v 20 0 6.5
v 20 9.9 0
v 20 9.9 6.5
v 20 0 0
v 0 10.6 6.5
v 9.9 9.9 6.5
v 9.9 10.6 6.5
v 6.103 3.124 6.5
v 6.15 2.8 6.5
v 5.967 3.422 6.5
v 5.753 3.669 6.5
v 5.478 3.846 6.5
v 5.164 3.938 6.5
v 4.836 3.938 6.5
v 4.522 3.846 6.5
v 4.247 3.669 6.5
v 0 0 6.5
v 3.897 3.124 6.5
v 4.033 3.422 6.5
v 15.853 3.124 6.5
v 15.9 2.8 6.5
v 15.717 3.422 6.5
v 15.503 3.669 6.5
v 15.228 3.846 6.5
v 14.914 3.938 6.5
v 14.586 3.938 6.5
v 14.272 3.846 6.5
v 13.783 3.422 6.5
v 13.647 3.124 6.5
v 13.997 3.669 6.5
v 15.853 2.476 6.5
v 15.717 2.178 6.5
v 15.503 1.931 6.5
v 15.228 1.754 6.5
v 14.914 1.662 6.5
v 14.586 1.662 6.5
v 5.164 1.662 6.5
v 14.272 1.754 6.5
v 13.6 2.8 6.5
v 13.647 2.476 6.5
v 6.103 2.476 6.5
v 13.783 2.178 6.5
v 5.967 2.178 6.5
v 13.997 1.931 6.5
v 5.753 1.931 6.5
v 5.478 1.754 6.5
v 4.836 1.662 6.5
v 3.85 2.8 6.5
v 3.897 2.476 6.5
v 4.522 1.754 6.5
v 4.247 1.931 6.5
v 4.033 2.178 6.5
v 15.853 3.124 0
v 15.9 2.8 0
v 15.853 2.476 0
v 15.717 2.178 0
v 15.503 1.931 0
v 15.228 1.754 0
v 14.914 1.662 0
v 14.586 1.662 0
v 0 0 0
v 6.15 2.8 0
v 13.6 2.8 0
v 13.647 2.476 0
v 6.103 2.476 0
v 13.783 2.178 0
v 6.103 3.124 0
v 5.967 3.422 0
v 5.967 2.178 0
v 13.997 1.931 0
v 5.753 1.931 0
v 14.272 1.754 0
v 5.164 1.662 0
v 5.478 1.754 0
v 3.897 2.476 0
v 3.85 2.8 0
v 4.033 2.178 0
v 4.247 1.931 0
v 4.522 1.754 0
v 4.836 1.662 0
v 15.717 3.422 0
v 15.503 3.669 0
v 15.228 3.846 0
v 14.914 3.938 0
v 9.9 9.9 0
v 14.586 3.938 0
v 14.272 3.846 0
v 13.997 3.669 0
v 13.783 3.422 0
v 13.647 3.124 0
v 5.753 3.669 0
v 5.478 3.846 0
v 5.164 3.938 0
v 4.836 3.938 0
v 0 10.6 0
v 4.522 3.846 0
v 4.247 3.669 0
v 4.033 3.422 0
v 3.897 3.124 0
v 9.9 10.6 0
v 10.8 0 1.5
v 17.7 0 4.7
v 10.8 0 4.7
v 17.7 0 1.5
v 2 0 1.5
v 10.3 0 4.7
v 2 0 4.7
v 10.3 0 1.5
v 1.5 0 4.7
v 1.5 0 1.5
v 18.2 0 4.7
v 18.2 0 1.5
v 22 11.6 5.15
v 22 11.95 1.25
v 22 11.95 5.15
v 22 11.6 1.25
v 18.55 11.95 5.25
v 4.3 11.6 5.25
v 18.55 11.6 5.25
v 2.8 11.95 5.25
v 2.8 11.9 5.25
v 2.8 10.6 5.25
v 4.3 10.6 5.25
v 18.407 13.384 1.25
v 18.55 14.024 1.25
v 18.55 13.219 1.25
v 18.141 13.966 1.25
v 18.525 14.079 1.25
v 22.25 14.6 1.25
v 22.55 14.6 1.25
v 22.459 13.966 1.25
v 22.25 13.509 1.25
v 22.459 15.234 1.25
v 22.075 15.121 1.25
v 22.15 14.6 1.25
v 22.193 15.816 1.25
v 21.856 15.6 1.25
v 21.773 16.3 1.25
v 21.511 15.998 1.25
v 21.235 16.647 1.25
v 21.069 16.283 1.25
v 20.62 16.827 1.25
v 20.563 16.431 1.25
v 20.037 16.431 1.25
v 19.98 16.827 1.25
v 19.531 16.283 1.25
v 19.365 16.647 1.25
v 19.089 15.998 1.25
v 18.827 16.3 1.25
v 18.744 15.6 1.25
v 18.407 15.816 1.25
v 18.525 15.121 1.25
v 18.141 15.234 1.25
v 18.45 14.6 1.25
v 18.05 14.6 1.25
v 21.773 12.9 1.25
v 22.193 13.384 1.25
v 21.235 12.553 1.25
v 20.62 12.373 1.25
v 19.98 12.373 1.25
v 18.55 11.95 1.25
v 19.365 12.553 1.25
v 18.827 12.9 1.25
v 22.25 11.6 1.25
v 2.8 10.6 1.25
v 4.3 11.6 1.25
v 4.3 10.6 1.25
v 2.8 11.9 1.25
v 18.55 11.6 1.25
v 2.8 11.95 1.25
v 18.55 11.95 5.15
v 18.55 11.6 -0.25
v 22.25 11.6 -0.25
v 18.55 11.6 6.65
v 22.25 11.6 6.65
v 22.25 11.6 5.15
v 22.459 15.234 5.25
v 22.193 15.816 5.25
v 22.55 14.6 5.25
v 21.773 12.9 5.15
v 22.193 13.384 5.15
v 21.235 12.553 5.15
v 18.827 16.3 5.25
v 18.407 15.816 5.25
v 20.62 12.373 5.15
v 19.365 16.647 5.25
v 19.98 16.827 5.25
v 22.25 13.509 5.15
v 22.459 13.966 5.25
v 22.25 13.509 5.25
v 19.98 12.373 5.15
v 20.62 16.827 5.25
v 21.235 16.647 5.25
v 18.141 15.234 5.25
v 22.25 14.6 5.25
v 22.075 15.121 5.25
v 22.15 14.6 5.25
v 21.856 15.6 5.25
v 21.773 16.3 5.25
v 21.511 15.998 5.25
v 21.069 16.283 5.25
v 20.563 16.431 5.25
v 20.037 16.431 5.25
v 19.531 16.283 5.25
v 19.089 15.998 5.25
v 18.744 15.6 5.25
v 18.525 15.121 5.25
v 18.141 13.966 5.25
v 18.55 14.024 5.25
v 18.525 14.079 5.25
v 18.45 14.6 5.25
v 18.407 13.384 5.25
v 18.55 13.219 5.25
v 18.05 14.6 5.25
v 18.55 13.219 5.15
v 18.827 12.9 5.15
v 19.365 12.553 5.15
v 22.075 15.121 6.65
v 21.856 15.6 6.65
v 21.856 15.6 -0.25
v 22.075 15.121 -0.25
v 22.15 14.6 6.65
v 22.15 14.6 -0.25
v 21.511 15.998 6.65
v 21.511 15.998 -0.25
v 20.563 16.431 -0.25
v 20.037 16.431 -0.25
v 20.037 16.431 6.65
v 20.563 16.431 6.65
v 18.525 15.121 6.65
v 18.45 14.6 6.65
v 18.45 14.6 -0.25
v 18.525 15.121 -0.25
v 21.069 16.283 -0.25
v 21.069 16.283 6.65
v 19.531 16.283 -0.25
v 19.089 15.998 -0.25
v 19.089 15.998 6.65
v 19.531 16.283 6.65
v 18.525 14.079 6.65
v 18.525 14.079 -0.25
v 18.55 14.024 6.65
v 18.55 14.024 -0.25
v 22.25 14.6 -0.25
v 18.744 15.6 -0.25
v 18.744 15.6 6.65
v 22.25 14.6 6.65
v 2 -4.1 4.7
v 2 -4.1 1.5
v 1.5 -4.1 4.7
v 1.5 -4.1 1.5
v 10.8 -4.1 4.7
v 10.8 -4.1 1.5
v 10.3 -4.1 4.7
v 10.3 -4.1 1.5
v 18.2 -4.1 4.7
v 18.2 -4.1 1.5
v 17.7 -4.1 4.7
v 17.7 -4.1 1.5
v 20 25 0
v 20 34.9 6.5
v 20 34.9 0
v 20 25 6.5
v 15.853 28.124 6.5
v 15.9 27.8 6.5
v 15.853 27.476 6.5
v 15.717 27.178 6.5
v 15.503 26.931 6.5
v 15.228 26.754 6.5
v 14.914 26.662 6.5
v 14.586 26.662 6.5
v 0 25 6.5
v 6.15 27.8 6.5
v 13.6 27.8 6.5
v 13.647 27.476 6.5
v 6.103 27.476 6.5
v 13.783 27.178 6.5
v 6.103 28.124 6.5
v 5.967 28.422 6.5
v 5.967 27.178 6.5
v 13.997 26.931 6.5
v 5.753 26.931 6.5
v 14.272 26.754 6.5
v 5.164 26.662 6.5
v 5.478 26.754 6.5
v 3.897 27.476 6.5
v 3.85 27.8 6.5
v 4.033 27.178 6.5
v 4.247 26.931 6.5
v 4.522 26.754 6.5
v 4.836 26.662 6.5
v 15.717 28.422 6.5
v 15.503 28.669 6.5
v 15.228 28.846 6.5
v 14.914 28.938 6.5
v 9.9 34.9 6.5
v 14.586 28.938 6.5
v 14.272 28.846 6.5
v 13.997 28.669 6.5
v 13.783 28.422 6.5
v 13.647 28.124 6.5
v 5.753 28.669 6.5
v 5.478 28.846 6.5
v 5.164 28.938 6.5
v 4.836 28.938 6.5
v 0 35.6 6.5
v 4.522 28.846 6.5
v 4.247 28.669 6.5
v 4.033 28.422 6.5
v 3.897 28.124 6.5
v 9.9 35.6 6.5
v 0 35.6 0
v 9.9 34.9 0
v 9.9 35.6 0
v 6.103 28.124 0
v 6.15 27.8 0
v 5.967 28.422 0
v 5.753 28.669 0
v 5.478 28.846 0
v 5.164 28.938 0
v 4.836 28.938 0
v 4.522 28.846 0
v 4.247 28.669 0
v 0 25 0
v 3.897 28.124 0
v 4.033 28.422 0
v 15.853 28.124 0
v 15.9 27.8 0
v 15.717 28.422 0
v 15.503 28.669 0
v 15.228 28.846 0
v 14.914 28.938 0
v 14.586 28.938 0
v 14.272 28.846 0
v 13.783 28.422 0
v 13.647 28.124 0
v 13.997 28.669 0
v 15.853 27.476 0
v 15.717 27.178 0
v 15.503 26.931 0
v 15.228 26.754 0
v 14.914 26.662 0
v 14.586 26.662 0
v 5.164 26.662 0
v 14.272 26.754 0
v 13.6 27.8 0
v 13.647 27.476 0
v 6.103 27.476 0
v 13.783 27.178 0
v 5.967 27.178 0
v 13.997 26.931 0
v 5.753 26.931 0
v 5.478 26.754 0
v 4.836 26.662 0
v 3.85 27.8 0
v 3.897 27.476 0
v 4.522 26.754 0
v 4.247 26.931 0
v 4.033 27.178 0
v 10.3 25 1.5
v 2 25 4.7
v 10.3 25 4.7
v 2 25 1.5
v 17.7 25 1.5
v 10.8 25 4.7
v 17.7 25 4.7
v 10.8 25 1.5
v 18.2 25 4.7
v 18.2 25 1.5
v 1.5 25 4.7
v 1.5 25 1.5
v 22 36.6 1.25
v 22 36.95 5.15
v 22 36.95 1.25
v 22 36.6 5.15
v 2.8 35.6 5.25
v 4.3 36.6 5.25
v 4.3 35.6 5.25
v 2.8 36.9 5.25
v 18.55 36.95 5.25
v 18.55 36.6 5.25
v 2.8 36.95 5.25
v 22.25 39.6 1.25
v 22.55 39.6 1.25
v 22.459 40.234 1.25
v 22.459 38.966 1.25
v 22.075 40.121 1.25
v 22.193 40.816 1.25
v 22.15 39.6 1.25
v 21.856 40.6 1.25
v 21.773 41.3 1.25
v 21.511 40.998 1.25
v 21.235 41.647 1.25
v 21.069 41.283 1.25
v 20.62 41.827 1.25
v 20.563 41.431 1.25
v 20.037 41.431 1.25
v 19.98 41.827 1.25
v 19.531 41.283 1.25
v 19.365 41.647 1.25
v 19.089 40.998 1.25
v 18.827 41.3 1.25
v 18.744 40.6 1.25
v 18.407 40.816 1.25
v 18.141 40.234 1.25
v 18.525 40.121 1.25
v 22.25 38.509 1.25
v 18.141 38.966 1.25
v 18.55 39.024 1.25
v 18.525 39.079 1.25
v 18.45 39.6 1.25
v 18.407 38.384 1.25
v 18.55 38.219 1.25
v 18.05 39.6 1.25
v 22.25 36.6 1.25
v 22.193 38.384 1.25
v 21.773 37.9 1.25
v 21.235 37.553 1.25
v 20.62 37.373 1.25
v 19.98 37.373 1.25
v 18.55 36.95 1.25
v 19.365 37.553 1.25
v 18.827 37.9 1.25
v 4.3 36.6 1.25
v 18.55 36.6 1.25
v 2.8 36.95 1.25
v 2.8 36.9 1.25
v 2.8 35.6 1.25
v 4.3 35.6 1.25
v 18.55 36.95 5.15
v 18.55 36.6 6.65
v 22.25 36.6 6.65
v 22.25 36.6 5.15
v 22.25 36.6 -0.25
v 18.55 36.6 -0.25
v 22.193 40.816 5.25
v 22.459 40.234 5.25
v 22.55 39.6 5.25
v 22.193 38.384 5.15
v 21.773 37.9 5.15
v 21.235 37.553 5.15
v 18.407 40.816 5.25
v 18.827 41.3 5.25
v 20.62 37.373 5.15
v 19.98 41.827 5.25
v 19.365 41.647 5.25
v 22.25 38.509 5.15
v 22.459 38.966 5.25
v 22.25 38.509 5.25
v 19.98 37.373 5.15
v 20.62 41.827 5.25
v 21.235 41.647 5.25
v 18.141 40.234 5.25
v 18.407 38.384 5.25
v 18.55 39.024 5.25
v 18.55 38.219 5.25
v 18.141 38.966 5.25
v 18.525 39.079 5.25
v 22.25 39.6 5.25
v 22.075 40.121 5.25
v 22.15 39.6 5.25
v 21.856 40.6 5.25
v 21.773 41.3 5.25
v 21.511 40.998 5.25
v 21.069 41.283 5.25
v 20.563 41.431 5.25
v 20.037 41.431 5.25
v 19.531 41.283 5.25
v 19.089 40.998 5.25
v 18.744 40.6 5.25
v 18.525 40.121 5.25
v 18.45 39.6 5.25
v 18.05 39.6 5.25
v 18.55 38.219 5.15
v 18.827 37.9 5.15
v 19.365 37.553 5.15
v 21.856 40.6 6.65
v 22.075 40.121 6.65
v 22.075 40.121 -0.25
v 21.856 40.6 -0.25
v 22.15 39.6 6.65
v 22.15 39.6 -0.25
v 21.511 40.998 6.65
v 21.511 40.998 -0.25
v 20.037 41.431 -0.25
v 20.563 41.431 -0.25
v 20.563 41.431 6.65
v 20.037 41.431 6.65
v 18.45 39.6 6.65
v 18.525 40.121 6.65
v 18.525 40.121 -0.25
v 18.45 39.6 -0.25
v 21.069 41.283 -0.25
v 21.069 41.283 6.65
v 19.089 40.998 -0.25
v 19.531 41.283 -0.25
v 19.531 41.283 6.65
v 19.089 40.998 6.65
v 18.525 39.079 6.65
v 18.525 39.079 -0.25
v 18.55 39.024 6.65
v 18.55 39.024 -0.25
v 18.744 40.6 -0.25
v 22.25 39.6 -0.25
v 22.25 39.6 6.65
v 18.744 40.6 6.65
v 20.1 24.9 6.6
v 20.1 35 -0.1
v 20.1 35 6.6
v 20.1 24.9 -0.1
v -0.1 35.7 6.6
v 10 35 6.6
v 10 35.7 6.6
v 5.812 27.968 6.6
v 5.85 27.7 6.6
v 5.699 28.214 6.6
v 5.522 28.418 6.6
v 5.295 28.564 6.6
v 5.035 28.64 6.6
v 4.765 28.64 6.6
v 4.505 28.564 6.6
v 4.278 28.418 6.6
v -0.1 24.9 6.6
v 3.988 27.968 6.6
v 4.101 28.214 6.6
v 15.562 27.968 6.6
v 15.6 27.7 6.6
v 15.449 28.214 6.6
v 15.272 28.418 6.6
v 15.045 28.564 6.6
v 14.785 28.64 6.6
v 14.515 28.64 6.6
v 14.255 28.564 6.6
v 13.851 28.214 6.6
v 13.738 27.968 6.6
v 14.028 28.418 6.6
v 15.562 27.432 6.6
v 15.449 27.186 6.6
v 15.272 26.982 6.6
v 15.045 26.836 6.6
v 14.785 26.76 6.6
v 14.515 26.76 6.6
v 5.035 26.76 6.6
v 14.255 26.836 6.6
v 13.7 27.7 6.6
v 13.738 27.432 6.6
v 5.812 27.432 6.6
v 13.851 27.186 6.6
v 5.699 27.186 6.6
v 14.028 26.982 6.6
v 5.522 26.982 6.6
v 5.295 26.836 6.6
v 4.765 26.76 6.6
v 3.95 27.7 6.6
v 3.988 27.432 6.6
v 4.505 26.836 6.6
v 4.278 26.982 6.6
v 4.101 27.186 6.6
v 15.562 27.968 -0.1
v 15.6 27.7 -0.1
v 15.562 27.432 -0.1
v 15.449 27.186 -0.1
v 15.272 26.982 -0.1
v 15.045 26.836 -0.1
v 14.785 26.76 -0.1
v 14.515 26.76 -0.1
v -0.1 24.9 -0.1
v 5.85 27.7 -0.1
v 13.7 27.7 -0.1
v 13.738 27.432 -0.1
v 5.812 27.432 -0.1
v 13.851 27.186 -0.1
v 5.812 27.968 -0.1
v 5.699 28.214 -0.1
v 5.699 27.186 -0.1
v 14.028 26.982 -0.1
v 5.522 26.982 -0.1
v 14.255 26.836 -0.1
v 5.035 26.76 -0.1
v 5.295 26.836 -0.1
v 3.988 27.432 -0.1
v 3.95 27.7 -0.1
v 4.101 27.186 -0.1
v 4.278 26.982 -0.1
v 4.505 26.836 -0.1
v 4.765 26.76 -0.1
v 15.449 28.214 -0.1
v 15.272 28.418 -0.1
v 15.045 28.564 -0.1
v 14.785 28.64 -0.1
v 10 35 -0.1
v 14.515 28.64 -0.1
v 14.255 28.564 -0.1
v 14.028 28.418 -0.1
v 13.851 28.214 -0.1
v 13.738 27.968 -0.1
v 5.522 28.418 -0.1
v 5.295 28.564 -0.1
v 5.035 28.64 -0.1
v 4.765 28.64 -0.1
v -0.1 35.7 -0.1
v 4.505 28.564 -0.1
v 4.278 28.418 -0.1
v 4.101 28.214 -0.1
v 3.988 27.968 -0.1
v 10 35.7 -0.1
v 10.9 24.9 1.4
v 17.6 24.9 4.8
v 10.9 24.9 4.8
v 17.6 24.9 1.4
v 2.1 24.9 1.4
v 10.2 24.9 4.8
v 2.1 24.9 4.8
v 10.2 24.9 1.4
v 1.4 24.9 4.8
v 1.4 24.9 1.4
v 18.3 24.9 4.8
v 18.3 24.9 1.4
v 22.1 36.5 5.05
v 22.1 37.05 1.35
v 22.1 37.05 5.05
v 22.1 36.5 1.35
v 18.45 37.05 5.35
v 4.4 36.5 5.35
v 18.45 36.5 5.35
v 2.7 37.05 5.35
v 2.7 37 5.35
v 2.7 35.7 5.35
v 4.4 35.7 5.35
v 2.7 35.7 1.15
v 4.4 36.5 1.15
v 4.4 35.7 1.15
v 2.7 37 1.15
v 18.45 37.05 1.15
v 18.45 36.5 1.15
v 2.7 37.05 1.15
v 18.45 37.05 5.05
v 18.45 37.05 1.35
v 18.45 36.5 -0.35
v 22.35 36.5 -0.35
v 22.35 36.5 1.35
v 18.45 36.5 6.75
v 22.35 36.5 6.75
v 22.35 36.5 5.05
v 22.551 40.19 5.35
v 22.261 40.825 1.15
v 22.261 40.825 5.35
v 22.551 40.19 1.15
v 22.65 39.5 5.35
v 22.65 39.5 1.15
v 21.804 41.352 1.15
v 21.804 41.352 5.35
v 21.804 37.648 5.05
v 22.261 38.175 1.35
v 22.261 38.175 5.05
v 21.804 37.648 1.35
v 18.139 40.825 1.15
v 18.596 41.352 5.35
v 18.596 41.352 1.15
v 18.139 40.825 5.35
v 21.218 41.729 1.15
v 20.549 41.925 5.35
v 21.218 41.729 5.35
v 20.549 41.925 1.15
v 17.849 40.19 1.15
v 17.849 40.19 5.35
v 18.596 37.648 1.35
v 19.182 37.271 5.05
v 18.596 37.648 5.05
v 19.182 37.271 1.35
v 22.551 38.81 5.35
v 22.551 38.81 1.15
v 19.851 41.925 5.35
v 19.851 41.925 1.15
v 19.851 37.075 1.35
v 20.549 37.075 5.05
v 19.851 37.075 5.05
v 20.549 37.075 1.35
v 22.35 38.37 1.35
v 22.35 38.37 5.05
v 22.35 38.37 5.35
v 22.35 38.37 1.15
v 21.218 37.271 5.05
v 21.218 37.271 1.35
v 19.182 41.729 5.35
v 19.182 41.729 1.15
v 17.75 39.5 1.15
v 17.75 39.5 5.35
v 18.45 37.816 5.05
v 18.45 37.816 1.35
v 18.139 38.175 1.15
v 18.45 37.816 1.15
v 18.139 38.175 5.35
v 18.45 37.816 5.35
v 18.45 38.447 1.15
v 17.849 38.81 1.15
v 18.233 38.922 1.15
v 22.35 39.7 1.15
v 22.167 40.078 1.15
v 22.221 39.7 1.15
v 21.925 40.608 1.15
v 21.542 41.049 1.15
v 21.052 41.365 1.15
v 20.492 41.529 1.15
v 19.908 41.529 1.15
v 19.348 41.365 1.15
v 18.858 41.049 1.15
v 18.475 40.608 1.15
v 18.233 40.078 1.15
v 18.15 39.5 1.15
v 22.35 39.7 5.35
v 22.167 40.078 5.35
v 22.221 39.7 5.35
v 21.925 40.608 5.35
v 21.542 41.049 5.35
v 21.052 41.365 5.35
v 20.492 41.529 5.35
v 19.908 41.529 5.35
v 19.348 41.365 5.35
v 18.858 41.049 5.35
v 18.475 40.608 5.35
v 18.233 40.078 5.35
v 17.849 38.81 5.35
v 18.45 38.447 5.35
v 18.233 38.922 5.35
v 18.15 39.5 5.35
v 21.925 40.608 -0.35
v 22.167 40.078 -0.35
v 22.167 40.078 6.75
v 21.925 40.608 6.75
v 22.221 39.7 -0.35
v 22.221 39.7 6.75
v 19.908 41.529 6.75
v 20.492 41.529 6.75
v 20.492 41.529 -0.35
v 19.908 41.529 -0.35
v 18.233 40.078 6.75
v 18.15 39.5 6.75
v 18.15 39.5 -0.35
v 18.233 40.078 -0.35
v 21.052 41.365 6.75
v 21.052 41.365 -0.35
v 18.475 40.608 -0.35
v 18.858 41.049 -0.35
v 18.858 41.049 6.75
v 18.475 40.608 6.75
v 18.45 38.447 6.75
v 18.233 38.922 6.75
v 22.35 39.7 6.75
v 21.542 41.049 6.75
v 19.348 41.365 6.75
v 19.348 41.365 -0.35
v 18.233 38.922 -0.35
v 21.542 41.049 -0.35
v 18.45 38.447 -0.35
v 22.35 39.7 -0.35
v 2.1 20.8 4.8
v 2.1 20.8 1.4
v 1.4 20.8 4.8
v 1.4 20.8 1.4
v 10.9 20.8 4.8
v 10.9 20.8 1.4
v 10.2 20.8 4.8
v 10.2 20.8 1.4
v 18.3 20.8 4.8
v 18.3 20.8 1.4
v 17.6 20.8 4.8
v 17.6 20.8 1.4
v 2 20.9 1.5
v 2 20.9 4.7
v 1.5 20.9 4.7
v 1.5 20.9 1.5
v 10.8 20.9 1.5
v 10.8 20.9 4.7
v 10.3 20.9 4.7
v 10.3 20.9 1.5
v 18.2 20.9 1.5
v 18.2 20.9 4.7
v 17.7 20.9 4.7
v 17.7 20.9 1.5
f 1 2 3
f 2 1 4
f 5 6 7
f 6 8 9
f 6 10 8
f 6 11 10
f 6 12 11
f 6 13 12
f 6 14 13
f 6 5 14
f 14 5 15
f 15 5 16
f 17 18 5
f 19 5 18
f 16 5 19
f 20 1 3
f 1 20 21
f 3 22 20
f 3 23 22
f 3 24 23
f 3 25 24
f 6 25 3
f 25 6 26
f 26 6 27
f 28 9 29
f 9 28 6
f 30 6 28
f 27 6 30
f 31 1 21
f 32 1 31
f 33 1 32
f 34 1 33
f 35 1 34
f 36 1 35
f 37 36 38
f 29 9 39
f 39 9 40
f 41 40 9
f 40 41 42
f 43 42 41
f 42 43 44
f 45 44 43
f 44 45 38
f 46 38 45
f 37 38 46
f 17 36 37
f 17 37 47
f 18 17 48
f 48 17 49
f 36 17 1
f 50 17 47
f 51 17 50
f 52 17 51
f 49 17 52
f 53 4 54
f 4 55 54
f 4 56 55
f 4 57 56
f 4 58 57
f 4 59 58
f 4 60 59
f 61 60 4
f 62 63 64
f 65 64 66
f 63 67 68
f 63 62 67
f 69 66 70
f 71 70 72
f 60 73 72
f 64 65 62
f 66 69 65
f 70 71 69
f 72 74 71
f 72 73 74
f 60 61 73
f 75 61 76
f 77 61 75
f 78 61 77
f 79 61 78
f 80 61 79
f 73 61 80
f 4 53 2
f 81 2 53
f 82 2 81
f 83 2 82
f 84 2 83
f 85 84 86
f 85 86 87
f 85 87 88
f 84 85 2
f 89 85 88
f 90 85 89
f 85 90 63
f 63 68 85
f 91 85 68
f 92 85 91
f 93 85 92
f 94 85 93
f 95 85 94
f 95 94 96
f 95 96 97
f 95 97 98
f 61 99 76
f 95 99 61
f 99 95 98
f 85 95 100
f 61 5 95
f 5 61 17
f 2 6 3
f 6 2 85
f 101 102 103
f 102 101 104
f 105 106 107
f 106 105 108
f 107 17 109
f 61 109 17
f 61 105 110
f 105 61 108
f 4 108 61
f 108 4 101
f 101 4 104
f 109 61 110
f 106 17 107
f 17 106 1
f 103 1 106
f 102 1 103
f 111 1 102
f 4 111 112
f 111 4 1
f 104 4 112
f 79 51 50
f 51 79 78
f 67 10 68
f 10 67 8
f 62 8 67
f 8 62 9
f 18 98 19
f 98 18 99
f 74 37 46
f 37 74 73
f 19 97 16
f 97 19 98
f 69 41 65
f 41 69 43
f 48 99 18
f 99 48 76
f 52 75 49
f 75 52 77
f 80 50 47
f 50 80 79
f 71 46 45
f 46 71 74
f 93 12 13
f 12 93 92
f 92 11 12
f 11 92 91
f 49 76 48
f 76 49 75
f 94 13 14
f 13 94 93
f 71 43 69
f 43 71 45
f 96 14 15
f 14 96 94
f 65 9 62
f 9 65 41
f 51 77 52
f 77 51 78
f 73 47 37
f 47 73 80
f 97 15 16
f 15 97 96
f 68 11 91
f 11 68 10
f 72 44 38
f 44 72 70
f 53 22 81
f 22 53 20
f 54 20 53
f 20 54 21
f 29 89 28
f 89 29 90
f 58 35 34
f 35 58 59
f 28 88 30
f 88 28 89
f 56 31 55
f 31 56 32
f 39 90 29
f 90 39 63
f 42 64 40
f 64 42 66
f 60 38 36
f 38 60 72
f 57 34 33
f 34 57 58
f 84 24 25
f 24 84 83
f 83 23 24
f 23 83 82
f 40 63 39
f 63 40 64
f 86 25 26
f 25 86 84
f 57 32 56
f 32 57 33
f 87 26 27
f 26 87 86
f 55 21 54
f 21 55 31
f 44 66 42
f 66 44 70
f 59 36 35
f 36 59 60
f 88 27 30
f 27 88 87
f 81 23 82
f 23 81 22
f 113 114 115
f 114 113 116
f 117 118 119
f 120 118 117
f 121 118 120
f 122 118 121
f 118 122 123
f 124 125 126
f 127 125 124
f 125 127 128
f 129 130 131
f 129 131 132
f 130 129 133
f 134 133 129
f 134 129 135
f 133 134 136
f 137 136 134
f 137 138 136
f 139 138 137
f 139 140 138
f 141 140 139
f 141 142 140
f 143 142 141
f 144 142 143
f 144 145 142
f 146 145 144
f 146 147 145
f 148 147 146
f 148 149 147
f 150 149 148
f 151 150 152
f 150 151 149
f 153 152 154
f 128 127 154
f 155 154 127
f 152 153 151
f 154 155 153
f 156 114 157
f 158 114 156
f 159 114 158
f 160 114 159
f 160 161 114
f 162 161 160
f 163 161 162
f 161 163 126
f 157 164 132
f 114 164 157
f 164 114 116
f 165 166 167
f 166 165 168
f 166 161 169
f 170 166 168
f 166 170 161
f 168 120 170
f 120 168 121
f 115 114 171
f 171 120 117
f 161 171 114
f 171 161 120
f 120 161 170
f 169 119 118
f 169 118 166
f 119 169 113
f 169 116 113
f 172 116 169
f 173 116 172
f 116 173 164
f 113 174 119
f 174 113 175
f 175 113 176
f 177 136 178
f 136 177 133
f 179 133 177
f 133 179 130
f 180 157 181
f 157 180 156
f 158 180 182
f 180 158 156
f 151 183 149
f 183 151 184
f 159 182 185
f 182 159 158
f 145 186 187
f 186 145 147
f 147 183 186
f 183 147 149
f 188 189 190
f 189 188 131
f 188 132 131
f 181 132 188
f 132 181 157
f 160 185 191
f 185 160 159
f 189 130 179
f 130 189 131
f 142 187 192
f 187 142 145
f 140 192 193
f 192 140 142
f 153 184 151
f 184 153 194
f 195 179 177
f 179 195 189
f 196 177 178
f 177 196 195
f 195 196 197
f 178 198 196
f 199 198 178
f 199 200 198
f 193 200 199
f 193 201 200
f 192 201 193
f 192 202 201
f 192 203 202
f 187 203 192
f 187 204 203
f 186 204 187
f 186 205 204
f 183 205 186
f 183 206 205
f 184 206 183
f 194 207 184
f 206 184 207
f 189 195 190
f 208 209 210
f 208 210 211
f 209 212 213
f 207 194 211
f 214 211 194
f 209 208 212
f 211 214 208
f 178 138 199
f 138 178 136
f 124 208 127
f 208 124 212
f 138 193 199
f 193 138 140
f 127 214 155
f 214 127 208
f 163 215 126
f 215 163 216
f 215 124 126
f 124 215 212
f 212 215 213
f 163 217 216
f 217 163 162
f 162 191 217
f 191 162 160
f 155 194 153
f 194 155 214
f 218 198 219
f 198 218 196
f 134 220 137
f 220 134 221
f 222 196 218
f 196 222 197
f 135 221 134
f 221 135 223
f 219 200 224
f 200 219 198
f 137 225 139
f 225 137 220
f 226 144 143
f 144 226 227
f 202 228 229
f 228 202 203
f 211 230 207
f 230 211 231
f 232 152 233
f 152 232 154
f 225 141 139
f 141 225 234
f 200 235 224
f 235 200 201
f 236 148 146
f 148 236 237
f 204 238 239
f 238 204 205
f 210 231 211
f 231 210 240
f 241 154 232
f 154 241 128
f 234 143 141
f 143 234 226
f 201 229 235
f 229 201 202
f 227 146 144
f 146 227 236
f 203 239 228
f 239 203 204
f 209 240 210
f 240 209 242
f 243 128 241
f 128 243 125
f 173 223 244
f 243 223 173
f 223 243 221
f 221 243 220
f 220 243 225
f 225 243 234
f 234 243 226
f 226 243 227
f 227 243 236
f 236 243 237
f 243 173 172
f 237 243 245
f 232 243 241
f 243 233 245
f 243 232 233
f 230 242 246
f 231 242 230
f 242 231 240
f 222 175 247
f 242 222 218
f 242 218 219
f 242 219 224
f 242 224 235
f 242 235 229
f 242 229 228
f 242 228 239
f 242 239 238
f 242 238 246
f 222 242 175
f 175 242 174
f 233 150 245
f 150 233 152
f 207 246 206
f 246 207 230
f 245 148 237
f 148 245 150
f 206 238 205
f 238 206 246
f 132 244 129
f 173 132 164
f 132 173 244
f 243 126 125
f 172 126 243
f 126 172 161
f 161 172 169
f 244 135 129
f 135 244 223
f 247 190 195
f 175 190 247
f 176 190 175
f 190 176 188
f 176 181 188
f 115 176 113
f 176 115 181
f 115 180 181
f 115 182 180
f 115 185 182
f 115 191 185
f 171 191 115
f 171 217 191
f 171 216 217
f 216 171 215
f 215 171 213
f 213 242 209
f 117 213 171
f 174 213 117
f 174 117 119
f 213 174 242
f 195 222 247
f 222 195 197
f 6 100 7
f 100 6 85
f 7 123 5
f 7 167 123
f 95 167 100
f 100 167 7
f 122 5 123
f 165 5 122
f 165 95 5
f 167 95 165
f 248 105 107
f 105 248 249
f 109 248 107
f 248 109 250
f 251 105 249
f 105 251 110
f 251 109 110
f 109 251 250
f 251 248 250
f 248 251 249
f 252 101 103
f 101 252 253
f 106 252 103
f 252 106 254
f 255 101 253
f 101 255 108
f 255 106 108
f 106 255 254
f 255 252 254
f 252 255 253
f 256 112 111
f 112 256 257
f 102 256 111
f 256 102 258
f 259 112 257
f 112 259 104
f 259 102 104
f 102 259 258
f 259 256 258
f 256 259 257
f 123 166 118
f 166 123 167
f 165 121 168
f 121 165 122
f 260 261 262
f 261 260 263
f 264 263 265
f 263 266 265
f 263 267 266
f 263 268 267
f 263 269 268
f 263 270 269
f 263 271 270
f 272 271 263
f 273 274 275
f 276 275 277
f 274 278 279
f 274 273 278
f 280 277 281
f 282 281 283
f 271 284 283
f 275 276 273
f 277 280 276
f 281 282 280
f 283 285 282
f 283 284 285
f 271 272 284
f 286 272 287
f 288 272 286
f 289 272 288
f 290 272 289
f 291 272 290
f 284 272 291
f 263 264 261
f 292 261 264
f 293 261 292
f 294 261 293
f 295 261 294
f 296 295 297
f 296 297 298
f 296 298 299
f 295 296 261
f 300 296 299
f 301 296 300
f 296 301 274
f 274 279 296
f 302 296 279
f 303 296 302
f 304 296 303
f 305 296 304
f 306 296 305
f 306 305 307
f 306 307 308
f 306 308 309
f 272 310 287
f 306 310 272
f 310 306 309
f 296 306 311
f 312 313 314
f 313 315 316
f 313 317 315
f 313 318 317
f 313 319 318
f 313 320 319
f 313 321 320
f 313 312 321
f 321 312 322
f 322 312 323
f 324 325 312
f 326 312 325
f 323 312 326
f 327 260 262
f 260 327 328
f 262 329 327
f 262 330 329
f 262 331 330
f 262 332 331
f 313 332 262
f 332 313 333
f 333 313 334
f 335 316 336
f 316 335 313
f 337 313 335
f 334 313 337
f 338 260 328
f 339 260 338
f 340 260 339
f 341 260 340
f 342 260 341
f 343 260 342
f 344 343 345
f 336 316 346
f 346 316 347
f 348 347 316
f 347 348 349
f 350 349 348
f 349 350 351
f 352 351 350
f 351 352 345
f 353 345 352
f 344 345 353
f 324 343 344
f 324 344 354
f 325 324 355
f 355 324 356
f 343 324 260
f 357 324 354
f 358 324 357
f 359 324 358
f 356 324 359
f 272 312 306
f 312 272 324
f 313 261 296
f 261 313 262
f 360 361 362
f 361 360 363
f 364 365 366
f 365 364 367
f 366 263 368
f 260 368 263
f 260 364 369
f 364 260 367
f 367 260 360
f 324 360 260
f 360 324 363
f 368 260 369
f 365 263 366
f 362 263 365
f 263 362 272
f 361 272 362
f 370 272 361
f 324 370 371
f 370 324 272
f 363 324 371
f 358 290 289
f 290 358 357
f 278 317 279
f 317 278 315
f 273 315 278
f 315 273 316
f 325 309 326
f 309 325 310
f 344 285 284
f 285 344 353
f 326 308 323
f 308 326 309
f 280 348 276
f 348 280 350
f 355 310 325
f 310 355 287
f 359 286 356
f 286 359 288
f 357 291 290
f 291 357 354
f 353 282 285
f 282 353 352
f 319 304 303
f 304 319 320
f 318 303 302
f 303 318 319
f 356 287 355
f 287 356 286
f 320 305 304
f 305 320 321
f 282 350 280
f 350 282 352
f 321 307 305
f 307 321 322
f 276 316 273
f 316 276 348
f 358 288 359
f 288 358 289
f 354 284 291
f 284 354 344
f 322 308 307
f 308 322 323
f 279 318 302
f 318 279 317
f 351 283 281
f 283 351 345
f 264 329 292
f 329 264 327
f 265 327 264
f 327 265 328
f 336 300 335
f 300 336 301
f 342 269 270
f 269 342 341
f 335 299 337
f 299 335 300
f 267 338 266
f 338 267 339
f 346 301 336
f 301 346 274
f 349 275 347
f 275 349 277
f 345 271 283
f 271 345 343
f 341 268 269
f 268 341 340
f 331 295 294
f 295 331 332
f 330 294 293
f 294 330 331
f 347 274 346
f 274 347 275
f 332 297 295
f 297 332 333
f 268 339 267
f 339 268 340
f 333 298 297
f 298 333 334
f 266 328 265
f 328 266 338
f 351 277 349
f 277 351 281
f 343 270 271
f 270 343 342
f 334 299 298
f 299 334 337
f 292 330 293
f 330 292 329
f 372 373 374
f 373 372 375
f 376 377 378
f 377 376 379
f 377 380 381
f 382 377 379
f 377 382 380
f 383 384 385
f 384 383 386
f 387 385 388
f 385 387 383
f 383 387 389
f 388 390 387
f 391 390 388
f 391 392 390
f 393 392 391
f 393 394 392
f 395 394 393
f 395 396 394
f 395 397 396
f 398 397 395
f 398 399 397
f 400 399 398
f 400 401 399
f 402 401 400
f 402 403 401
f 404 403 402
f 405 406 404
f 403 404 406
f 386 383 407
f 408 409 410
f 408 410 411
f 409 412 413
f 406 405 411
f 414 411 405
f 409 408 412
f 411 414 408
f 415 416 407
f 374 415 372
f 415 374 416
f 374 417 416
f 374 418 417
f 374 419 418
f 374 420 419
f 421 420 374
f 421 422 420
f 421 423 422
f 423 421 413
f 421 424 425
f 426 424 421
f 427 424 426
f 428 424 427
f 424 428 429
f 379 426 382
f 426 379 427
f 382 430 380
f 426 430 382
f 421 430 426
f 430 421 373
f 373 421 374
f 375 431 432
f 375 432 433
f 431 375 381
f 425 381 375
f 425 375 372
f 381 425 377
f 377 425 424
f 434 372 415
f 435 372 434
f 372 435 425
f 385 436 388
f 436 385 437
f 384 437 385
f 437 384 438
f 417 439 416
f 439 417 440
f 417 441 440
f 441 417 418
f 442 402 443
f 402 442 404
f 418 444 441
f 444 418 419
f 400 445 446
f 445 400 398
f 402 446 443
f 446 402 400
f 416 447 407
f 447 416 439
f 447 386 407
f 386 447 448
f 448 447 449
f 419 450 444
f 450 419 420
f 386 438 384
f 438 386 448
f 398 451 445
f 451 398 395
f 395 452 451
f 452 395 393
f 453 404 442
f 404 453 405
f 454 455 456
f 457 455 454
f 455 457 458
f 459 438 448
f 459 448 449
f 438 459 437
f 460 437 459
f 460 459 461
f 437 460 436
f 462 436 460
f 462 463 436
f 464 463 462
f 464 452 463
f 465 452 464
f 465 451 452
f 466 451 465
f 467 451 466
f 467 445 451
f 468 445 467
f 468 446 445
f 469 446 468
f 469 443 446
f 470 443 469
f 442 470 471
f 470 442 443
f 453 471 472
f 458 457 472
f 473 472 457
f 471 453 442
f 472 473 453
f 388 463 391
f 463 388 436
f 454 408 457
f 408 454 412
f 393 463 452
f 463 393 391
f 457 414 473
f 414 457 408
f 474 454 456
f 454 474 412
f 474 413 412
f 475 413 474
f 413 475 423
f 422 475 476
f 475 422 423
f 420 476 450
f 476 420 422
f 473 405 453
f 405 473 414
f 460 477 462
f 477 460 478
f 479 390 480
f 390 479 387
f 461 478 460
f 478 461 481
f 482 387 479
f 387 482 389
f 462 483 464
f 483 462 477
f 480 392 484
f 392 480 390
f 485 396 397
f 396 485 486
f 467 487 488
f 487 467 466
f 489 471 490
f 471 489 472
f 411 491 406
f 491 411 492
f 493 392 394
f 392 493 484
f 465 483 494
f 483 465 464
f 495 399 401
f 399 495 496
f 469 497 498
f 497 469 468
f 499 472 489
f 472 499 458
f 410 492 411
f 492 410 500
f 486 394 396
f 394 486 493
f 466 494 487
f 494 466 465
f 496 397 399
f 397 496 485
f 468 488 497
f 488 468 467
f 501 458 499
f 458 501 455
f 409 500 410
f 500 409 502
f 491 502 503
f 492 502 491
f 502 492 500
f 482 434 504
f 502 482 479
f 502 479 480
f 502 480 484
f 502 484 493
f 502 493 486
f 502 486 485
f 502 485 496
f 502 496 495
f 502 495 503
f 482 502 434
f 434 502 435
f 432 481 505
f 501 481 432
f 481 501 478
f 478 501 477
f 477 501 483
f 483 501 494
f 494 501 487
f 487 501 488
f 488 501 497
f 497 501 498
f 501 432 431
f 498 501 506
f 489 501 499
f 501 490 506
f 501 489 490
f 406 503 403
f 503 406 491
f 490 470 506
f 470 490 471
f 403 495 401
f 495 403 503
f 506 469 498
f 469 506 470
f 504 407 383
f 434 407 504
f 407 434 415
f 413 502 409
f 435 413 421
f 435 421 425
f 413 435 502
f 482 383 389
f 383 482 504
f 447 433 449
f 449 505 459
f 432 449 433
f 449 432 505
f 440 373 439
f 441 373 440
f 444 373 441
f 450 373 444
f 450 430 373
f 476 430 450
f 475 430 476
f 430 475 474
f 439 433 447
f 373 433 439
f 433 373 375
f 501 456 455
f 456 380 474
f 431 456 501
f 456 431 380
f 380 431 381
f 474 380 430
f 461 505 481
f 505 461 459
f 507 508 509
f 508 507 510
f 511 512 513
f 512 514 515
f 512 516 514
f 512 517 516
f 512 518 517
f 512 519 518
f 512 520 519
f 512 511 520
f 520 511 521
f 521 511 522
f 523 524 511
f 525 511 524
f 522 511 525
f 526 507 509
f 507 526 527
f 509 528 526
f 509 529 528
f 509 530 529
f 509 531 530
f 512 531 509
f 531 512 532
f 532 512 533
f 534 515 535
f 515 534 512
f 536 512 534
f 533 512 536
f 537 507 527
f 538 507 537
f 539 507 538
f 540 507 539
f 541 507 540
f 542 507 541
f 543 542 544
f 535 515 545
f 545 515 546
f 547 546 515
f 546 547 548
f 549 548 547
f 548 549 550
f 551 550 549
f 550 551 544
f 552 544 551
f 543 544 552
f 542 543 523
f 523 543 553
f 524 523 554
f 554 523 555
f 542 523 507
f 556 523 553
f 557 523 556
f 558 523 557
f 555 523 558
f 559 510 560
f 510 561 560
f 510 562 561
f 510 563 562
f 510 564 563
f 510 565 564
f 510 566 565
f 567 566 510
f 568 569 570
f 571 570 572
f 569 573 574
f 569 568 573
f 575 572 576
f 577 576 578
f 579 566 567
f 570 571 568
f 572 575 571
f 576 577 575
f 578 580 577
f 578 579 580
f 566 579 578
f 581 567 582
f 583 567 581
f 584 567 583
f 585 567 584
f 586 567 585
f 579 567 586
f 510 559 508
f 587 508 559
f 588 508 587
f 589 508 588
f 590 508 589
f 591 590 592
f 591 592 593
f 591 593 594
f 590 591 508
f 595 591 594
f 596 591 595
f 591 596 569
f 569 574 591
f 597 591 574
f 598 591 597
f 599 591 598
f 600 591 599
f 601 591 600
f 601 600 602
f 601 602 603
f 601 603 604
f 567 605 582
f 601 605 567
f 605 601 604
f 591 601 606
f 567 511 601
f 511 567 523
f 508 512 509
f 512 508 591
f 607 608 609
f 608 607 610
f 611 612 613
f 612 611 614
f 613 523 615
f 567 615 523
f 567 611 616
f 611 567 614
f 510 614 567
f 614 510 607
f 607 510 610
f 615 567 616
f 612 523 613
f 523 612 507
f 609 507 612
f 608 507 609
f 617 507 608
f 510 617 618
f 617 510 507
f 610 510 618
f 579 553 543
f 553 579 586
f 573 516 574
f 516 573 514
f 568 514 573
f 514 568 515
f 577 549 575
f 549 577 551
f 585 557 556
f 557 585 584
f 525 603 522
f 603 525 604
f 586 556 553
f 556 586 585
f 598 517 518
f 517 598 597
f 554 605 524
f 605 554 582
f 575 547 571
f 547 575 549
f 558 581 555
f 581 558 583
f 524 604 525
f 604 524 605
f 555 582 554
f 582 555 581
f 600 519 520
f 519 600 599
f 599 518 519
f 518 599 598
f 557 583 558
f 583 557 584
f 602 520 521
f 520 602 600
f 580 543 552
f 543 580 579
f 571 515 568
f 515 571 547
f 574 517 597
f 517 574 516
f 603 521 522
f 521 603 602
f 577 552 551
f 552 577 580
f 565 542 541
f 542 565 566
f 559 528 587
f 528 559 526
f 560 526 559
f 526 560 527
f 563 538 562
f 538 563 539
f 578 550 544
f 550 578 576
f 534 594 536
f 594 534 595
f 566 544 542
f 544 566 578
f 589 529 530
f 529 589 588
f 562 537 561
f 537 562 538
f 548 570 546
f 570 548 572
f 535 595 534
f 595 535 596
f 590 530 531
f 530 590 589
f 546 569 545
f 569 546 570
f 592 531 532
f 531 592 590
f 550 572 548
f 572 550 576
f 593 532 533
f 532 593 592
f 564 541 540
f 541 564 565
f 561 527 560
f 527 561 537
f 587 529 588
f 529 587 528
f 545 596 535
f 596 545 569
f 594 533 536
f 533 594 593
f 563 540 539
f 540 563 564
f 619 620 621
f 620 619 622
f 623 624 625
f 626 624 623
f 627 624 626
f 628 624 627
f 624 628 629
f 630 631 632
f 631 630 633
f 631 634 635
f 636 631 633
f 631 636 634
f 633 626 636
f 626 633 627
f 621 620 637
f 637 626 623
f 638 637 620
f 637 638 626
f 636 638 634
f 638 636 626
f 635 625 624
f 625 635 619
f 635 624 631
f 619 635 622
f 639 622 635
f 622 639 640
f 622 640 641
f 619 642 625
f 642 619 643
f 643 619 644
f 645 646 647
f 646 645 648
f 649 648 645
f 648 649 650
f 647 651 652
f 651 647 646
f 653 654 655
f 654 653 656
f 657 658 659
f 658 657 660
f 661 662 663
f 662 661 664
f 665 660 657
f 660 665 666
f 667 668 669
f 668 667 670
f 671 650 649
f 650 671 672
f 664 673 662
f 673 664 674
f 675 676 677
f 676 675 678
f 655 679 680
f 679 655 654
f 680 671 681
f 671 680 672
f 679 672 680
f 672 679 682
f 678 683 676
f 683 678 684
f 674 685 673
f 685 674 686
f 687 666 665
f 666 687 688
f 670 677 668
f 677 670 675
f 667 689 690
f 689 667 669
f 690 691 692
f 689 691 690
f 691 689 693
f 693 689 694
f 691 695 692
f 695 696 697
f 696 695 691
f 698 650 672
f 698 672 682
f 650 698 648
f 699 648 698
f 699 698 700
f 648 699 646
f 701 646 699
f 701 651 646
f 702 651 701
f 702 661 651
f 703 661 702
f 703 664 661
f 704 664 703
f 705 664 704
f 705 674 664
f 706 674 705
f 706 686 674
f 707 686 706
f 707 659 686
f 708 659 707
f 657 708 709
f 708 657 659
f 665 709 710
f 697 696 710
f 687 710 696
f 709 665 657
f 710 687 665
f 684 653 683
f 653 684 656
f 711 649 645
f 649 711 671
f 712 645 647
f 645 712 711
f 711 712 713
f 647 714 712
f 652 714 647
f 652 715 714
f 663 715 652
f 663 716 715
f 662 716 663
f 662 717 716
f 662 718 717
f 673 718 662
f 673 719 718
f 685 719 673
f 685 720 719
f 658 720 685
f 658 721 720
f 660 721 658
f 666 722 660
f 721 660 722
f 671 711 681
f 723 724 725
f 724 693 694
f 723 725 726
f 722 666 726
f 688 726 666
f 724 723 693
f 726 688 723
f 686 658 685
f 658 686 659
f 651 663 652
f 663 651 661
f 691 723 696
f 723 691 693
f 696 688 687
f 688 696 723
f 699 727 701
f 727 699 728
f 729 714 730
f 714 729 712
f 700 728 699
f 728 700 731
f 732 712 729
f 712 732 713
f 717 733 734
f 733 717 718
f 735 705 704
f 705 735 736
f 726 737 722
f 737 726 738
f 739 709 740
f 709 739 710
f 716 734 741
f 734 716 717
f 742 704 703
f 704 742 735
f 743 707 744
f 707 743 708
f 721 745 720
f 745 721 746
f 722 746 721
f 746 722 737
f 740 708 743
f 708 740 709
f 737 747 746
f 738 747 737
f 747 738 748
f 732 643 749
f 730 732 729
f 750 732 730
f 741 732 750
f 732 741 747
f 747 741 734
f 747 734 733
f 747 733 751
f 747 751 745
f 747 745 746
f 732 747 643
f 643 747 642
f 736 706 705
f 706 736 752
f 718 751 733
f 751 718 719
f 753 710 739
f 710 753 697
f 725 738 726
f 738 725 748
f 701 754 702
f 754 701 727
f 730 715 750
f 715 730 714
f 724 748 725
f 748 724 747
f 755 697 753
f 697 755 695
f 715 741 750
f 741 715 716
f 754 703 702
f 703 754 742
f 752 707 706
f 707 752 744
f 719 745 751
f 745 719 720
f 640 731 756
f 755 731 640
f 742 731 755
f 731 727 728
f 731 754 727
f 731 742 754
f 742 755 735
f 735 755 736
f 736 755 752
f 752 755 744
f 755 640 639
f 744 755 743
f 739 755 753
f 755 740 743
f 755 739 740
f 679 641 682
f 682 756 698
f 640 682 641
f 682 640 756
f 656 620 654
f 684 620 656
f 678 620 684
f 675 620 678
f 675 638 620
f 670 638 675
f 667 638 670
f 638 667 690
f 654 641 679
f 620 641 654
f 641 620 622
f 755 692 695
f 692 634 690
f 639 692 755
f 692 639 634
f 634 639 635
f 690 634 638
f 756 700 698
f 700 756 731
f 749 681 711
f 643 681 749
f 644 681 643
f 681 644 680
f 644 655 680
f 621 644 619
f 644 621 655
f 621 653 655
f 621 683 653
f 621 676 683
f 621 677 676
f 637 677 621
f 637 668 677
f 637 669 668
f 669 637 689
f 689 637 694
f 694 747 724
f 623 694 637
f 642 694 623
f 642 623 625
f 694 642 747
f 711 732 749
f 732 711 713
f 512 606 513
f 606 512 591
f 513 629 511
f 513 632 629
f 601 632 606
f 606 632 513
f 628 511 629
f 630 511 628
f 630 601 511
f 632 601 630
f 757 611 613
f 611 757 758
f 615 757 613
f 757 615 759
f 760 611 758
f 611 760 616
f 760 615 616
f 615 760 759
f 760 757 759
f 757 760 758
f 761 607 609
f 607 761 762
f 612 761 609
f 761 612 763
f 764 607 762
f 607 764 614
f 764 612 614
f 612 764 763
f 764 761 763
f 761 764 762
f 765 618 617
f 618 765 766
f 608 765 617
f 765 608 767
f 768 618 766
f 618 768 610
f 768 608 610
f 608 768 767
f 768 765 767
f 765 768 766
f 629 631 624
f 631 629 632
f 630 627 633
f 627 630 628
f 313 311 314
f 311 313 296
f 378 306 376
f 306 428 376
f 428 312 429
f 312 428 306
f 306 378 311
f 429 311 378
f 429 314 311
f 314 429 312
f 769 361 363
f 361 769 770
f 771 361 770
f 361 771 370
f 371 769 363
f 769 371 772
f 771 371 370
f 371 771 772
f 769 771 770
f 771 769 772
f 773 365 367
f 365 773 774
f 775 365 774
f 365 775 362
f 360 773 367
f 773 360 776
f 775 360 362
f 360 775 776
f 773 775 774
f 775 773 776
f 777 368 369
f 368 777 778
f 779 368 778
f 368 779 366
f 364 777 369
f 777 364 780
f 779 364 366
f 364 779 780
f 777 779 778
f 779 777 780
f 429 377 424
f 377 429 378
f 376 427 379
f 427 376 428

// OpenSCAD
// switch.scad
// micro switch 



//--------------
module switch(
tol=0,  // include for cutting
ang1=5,  // angle of the lever arm
wirecut=0   // set to 1 for clearance around terminals
){

difference(){
  // switch body
  cube([20+tol,9.9+tol,6.5+tol]);  

  // mounting hole NO
  translate([5.0,2.8,-1])
  cylinder(r=2.3/2-tol,h=10,$fn=22);

  // mounting hole NC
  translate([14.75,2.8,-1])
  cylinder(r=2.3/2-tol,h=10,$fn=22);
}

// lump on top body
translate([0,9.9,0])
cube([9.9+tol,0.7+tol,6.5+tol]);  
  
// common leg
translate([1.5,-4.1,1.5])
cube([0.5+tol,4.1+tol,3.2+tol]);

// normally open leg
translate([10.3,-4.1,1.5])
cube([0.5+tol,4.1+tol,3.2+tol]);

// normally closed leg
translate([17.7,-4.1,1.5])
cube([0.5+tol,4.1+tol,3.2+tol]);

// lever fulcrum
translate([2.8,10.4,1.25])
cube([1.5+tol,1.5+tol,4.0+tol]);

// -------- these parts move:

// lever arm
translate([2.8,11.6,1.25])
rotate([0,0,ang1]){
  
  // arm
  cube([19.2+tol,0.35+tol,4.0+tol]);
  
  // roller
  translate([17.5,3.0,0])
  cylinder(r=4.5/2+tol,h=4+tol,$fn=22);
  
  // roller support
  translate([17.5,3.0,-1.5])
  cylinder(r=3.7/2+tol,h=6.9+tol,$fn=22);
  color("cyan")
  translate([17.5-1.75,0,-1.5])
  cube([3.7+tol,3+tol,1.5+tol]);
  color("cyan")
  translate([17.5-1.75,0,-1.5+5.4])
  cube([3.7+tol,3+tol,1.5+tol]);
  
}

}  // end of module switch

//=================
 
Tol1=0.2;
switch(ang1=0);

translate([0,25,0])
difference(){
translate([-Tol1/2,-Tol1/2,-Tol1/2])  
switch(ang1=0,tol=Tol1);
switch(ang1=0);
}

//==================
